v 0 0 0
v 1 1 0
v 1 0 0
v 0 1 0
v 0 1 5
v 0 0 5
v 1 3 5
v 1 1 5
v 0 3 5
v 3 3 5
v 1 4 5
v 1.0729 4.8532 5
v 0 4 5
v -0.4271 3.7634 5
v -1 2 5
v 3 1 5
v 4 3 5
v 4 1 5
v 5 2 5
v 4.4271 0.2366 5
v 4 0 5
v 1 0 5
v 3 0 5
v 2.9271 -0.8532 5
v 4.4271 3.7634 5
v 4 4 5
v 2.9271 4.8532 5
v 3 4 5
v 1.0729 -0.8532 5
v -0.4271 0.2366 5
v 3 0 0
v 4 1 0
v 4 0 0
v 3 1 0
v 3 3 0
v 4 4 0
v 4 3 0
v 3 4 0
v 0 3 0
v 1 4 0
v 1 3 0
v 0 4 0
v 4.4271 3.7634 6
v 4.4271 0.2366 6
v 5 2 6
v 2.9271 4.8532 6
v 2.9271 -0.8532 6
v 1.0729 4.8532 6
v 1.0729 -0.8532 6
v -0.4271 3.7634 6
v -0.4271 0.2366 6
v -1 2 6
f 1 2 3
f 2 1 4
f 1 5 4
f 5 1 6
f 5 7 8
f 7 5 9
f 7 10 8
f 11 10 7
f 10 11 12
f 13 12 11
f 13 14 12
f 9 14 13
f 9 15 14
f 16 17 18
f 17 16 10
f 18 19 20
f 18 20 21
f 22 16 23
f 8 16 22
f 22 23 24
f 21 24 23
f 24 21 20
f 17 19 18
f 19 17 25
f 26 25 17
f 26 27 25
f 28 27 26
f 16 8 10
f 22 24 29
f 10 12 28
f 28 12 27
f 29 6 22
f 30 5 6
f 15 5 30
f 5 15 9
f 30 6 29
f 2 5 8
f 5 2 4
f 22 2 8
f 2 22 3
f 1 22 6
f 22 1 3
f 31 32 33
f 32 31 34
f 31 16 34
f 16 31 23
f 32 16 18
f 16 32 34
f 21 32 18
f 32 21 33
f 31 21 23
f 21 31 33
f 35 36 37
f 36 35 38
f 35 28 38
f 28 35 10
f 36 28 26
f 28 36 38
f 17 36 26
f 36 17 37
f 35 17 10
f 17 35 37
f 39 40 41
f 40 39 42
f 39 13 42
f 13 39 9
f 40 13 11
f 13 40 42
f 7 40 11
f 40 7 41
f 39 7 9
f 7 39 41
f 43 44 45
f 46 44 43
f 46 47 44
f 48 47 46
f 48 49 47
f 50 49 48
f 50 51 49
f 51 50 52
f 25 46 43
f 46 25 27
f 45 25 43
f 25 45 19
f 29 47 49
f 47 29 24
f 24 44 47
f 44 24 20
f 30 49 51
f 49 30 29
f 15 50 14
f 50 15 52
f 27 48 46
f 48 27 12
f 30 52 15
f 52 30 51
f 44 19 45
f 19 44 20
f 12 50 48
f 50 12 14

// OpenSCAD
linear_extrude(height = 5) square([2]);
translate([3,0,0]) linear_extrude(height = 5) square([2]);
translate([3,3,0]) linear_extrude(height = 5) square([2]);
translate([0,3,0]) linear_extrude(height = 5) square([2]);

translate([2,2,5]) linear_extrude(height = 1) circle(3);
